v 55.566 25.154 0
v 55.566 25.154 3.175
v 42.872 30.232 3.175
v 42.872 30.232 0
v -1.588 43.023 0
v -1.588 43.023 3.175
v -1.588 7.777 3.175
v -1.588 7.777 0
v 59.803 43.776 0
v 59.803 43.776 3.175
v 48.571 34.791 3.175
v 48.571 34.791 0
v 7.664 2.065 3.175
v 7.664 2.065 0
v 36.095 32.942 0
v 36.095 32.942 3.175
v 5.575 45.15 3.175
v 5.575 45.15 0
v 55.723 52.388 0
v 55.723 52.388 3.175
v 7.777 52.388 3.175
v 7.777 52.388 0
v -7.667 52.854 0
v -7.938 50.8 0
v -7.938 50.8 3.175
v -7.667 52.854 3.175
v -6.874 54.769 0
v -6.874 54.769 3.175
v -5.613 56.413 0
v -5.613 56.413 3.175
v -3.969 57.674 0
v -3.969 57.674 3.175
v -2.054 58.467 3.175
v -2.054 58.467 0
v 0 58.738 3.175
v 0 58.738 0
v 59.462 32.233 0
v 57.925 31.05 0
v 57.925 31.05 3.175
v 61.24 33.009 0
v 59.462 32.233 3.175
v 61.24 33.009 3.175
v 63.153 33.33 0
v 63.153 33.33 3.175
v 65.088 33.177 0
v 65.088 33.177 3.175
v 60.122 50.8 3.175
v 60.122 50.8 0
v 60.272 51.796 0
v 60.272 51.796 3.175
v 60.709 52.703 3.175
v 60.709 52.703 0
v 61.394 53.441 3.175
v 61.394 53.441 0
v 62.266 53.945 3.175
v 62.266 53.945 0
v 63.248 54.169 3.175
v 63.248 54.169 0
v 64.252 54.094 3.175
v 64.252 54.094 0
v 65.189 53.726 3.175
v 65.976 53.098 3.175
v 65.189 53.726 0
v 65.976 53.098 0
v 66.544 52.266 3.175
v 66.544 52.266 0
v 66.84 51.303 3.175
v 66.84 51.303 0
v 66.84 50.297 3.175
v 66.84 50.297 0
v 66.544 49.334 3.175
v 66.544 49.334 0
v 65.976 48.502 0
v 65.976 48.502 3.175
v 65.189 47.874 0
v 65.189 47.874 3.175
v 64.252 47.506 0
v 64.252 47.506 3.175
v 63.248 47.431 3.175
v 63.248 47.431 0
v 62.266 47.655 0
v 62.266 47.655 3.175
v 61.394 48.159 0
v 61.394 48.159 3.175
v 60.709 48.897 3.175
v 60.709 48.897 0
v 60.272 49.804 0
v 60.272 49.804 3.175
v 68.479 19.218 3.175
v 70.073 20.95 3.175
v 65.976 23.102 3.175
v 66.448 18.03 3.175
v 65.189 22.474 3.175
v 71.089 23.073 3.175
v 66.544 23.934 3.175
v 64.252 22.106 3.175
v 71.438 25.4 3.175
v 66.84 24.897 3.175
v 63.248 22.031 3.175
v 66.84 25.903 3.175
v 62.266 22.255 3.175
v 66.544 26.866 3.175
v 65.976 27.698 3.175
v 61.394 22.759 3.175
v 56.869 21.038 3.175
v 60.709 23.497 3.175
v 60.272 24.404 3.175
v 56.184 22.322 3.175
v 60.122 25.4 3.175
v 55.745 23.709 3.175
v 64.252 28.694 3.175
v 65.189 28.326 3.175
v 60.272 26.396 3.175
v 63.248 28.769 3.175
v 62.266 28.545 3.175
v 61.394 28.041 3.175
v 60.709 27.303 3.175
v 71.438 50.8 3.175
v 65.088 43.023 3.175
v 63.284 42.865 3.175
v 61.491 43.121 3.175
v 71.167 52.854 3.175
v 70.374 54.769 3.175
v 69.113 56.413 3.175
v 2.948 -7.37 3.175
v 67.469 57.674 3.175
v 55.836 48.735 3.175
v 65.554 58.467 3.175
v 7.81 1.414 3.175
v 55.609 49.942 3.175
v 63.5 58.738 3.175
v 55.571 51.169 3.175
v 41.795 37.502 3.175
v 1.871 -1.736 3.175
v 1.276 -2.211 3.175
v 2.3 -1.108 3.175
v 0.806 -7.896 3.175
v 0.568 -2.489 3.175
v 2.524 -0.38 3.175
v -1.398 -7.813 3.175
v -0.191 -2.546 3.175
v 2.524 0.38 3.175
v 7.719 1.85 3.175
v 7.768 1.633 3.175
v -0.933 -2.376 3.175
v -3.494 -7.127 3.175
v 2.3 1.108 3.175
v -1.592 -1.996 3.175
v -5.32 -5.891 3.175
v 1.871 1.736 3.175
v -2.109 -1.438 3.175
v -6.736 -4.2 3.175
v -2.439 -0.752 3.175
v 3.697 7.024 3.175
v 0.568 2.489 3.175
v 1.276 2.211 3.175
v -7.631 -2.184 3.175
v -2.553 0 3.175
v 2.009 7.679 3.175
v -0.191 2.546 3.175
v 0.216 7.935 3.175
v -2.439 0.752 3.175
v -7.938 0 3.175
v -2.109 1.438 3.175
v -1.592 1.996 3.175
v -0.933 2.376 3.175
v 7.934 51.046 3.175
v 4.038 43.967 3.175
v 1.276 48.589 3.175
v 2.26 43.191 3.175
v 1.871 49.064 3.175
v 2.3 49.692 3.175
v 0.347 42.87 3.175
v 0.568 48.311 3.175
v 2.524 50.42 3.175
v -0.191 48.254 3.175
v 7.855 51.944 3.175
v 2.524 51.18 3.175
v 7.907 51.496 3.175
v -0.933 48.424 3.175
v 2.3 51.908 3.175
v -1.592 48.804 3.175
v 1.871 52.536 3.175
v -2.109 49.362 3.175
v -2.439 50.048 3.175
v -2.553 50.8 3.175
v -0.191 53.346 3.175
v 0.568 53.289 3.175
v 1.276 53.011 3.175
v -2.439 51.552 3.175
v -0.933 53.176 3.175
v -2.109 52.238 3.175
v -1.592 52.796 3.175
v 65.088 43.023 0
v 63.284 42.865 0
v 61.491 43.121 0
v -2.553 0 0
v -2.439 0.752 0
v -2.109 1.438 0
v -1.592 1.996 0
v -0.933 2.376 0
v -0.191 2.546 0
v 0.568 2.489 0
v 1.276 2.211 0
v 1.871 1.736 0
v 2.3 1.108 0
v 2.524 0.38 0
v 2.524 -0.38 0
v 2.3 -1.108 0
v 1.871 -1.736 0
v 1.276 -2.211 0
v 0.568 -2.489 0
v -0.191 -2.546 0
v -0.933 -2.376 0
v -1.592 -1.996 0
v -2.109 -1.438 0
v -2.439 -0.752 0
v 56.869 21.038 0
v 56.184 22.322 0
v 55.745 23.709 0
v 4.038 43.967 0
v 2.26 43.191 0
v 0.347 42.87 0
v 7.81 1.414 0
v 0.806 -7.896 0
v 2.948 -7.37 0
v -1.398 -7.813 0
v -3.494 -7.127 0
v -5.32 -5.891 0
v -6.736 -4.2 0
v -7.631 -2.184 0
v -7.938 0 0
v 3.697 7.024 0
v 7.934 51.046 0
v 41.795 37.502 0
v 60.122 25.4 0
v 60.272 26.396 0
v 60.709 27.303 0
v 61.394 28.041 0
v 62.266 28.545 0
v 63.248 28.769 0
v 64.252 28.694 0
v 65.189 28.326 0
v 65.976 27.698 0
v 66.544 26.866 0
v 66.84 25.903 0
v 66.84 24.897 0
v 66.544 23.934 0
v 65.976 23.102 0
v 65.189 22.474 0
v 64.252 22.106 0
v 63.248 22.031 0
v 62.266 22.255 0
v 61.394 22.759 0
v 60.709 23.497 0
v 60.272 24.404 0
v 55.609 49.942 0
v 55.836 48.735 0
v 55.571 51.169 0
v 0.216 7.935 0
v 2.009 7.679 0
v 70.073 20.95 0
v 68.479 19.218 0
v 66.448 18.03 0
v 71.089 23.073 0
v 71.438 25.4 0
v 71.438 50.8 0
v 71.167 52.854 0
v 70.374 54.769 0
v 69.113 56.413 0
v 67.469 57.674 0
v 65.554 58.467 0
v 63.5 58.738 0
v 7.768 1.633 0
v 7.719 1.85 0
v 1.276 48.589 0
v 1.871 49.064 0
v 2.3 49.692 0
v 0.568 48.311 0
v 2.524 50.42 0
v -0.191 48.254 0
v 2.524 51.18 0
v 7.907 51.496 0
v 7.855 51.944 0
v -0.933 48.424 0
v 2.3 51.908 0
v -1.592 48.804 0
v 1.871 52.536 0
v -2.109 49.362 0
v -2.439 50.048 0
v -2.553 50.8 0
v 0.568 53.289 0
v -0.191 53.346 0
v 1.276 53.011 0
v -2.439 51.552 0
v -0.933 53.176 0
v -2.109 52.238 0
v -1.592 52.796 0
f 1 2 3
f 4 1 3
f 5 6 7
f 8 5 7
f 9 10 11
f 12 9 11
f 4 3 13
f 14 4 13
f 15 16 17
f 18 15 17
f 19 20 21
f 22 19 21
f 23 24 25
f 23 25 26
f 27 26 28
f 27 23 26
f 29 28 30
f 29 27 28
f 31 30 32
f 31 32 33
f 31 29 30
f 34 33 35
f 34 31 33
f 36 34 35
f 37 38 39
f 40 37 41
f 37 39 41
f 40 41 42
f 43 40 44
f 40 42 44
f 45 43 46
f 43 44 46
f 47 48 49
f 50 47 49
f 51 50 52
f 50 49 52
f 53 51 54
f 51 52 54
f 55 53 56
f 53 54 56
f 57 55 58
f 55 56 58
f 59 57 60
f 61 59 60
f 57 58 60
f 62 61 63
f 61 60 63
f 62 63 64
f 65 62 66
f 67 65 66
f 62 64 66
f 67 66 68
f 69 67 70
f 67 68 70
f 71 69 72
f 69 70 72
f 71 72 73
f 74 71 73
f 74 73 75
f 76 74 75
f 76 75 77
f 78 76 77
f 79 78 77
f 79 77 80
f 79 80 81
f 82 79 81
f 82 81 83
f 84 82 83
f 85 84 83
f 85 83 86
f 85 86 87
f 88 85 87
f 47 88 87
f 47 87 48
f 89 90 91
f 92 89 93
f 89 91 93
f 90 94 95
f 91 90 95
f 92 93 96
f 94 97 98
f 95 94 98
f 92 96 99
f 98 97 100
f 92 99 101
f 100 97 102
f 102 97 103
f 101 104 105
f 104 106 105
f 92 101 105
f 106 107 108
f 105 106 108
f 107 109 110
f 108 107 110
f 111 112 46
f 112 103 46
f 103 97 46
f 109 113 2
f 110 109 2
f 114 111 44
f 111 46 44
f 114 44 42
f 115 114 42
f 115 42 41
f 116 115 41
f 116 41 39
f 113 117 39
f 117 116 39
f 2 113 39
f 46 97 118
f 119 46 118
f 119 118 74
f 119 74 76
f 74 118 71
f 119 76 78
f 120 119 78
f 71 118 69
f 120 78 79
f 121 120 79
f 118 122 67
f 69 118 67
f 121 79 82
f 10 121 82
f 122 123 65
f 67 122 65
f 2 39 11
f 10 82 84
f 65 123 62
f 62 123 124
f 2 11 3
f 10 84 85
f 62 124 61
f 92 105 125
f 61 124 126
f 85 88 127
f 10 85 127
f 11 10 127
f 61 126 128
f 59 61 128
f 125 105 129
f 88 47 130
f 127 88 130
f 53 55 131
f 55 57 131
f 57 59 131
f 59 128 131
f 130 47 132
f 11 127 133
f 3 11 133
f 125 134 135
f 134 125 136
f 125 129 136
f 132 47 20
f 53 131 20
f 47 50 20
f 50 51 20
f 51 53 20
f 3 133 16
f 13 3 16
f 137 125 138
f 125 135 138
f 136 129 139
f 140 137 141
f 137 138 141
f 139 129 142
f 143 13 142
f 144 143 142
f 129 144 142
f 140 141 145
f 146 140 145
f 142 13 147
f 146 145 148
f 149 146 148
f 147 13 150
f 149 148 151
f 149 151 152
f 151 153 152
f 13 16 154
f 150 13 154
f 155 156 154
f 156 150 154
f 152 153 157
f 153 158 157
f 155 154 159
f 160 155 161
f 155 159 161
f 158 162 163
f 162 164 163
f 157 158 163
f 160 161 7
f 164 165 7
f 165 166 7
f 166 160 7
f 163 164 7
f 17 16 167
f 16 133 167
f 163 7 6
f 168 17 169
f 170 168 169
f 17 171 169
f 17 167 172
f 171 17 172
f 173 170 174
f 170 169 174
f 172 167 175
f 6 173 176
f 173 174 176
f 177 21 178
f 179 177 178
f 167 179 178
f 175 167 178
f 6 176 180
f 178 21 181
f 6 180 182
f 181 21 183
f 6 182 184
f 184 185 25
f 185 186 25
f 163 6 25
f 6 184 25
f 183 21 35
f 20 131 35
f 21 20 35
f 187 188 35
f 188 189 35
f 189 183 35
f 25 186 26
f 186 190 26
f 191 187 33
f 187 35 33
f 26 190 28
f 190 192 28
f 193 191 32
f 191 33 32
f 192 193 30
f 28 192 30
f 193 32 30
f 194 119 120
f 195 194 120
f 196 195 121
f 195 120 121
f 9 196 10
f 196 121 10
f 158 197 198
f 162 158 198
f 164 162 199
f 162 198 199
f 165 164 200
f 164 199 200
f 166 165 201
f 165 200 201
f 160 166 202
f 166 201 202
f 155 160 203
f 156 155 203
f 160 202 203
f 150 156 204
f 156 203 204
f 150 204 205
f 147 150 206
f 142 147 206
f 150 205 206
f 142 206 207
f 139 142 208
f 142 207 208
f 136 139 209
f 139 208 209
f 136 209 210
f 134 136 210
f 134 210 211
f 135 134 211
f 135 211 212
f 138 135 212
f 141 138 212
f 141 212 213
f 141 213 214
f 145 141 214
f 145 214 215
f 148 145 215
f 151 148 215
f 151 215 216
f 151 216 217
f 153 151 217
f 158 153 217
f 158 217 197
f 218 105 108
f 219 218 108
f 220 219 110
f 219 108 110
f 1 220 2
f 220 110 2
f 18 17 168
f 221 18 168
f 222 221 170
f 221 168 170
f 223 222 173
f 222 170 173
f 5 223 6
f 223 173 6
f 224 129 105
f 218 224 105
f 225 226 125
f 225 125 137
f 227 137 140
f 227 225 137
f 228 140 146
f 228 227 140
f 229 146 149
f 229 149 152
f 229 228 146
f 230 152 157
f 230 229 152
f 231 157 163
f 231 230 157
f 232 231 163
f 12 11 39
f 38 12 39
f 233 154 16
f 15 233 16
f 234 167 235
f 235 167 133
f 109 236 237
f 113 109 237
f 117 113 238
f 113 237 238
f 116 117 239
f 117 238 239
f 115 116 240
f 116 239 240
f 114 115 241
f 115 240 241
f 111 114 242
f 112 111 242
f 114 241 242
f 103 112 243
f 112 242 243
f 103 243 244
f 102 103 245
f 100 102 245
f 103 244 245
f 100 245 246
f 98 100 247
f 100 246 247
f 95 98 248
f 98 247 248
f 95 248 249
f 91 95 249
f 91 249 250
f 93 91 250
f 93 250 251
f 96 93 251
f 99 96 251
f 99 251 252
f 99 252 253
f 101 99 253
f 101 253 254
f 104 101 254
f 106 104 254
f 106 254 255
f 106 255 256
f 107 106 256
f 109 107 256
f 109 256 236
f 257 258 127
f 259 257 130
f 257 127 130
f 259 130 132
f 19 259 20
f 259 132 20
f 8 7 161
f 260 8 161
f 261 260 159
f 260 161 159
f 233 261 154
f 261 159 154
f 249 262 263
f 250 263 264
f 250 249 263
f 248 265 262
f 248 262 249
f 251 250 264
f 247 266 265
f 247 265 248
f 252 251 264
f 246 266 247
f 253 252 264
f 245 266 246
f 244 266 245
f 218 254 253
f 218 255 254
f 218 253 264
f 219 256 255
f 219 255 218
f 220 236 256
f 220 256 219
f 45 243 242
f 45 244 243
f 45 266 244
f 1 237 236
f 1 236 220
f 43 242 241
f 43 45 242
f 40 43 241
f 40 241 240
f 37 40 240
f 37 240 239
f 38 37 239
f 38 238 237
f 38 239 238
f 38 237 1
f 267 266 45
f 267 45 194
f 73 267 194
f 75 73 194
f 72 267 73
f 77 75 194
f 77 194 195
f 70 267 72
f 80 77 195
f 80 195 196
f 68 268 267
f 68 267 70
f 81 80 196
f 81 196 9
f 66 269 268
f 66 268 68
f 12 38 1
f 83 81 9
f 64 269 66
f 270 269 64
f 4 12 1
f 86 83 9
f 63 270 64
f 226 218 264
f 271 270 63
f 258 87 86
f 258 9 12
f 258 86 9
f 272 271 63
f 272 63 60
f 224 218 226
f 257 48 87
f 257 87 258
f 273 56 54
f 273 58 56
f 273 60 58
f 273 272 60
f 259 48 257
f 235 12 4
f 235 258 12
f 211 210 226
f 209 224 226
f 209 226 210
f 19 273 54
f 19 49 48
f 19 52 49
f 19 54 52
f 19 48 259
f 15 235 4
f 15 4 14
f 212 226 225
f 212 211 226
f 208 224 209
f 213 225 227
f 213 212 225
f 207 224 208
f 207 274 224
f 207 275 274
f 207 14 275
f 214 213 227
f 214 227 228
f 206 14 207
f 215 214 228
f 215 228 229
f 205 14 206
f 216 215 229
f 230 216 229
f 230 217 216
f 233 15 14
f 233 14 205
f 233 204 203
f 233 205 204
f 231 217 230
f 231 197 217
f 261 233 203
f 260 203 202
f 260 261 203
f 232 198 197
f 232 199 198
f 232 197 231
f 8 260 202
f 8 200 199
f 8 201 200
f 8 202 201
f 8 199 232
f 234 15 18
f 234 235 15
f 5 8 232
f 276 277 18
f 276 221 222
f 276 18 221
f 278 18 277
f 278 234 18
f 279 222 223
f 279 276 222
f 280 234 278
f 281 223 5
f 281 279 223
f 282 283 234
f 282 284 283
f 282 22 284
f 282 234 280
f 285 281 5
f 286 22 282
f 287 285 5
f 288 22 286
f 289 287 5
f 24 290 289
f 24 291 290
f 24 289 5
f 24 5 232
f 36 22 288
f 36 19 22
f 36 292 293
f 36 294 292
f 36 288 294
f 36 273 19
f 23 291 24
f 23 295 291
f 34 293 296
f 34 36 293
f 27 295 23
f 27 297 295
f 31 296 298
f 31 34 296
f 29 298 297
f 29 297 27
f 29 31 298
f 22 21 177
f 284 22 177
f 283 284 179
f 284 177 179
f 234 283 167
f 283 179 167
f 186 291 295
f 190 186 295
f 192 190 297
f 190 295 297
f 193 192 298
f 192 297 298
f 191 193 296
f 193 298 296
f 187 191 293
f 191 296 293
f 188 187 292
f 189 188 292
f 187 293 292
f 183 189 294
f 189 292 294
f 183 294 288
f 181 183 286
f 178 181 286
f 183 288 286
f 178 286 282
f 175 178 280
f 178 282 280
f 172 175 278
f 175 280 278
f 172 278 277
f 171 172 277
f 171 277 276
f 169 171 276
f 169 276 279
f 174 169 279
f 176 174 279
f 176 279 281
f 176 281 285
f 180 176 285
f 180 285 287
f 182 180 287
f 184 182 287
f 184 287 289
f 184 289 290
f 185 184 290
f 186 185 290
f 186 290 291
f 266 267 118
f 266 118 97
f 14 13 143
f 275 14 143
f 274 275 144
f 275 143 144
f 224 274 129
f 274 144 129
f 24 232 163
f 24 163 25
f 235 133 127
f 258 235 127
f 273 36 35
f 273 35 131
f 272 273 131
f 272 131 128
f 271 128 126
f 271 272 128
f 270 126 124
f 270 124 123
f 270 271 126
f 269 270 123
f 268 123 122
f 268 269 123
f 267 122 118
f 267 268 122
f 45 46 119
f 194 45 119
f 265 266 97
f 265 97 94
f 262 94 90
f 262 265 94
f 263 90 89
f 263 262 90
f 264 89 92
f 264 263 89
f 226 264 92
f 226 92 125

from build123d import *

# Parameters (mm, degrees)
BOSS_EXTRUDE1_DEPTH     = 3.175
F_1_4_CLEARANCE_HOLE1_D = 6.7564
F_10_CLEARANCE_HOLE1_D  = 5.1054
CUT_EXTRUDE1_DEPTH      = 93.539131925


with BuildPart() as part:
    # Sketch1 → Boss-Extrude1 (new body)
    with BuildSketch(Plane.XY):
        with BuildLine():
            Line((0, 58.7375), (63.5, 58.7375))
            ThreePointArc((63.5, 58.7375), (69.112660076, 56.412660076), (71.4375, 50.8))
            Line((71.4375, 50.8), (71.4375, 25.4))
            ThreePointArc((71.4375, 25.4), (70.072783642, 20.950008826), (66.447913494, 18.030216266))
            Line((66.447913494, 18.030216266), (2.947913494, -7.369783734))
            ThreePointArc((2.947913494, -7.369783734), (-4.449991174, -6.572783642), (-7.9375, 0))
            Line((-7.9375, 0), (-7.9375, 50.8))
            ThreePointArc((-7.9375, 50.8), (-5.612660076, 56.412660076), (0, 58.7375))
        make_face()
    extrude(amount=BOSS_EXTRUDE1_DEPTH)

    # 1/4 Clearance Hole1 (through all)
    with Locations(Plane.XY.offset(3.175)):
        with Locations((63.5, 50.8), (63.5, 25.4)):
            Hole(F_1_4_CLEARANCE_HOLE1_D / 2)

    # #10 Clearance Hole1 (through all)
    with Locations(Plane.XY.offset(3.175)):
        with Locations((0, 50.8), (0, 0)):
            Hole(F_10_CLEARANCE_HOLE1_D / 2)

    # Sketch6 → Cut-Extrude1 (cut, through all)
    with BuildSketch(Plane.XY.offset(3.175)):
        with BuildLine():
            Line((36.095363714, 32.942274862), (5.575352966, 45.150279161))
            ThreePointArc((5.575352966, 45.150279161), (2.259913756, 43.191012152), (-1.5875, 43.022870067))
            Line((-1.5875, 43.022870067), (-1.5875, 7.777129933))
            ThreePointArc((-1.5875, 7.777129933), (1.120121639, 7.858068068), (3.697288027, 7.023814312))
            Line((3.697288027, 7.023814312), (36.095363714, 32.942274862))
        make_face()
        with BuildLine():
            Line((7.933683761, 51.046106148), (41.794663135, 37.501714399))
            Line((41.794663135, 37.501714399), (55.835898421, 48.734702628))
            ThreePointArc((55.835898421, 48.734702628), (55.566297219, 50.554507771), (55.722870067, 52.3875))
            Line((55.722870067, 52.3875), (7.777129933, 52.3875))
            ThreePointArc((7.777129933, 52.3875), (7.883987005, 51.720138659), (7.933683761, 51.046106148))
        make_face()
        with BuildLine():
            Line((59.802711973, 43.776185688), (48.571302953, 34.791058471))
            Line((48.571302953, 34.791058471), (57.924647034, 31.049720839))
            ThreePointArc((57.924647034, 31.049720839), (61.240086244, 33.008987848), (65.0875, 33.177129933))
            Line((65.0875, 33.177129933), (65.0875, 43.022870067))
            ThreePointArc((65.0875, 43.022870067), (62.379878361, 42.941931932), (59.802711973, 43.776185688))
        make_face()
        with BuildLine():
            Line((55.566316239, 25.153893852), (42.872003532, 30.231618935))
            Line((42.872003532, 30.231618935), (7.664101579, 2.065297372))
            ThreePointArc((7.664101579, 2.065297372), (7.744125689, 1.741385529), (7.810466564, 1.414396799))
            Line((7.810466564, 1.414396799), (56.868698834, 21.037689707))
            ThreePointArc((56.868698834, 21.037689707), (55.932273748, 23.005542728), (55.566316239, 25.153893852))
        make_face()
    extrude(amount=-CUT_EXTRUDE1_DEPTH, mode=Mode.SUBTRACT)


solid = part.part
